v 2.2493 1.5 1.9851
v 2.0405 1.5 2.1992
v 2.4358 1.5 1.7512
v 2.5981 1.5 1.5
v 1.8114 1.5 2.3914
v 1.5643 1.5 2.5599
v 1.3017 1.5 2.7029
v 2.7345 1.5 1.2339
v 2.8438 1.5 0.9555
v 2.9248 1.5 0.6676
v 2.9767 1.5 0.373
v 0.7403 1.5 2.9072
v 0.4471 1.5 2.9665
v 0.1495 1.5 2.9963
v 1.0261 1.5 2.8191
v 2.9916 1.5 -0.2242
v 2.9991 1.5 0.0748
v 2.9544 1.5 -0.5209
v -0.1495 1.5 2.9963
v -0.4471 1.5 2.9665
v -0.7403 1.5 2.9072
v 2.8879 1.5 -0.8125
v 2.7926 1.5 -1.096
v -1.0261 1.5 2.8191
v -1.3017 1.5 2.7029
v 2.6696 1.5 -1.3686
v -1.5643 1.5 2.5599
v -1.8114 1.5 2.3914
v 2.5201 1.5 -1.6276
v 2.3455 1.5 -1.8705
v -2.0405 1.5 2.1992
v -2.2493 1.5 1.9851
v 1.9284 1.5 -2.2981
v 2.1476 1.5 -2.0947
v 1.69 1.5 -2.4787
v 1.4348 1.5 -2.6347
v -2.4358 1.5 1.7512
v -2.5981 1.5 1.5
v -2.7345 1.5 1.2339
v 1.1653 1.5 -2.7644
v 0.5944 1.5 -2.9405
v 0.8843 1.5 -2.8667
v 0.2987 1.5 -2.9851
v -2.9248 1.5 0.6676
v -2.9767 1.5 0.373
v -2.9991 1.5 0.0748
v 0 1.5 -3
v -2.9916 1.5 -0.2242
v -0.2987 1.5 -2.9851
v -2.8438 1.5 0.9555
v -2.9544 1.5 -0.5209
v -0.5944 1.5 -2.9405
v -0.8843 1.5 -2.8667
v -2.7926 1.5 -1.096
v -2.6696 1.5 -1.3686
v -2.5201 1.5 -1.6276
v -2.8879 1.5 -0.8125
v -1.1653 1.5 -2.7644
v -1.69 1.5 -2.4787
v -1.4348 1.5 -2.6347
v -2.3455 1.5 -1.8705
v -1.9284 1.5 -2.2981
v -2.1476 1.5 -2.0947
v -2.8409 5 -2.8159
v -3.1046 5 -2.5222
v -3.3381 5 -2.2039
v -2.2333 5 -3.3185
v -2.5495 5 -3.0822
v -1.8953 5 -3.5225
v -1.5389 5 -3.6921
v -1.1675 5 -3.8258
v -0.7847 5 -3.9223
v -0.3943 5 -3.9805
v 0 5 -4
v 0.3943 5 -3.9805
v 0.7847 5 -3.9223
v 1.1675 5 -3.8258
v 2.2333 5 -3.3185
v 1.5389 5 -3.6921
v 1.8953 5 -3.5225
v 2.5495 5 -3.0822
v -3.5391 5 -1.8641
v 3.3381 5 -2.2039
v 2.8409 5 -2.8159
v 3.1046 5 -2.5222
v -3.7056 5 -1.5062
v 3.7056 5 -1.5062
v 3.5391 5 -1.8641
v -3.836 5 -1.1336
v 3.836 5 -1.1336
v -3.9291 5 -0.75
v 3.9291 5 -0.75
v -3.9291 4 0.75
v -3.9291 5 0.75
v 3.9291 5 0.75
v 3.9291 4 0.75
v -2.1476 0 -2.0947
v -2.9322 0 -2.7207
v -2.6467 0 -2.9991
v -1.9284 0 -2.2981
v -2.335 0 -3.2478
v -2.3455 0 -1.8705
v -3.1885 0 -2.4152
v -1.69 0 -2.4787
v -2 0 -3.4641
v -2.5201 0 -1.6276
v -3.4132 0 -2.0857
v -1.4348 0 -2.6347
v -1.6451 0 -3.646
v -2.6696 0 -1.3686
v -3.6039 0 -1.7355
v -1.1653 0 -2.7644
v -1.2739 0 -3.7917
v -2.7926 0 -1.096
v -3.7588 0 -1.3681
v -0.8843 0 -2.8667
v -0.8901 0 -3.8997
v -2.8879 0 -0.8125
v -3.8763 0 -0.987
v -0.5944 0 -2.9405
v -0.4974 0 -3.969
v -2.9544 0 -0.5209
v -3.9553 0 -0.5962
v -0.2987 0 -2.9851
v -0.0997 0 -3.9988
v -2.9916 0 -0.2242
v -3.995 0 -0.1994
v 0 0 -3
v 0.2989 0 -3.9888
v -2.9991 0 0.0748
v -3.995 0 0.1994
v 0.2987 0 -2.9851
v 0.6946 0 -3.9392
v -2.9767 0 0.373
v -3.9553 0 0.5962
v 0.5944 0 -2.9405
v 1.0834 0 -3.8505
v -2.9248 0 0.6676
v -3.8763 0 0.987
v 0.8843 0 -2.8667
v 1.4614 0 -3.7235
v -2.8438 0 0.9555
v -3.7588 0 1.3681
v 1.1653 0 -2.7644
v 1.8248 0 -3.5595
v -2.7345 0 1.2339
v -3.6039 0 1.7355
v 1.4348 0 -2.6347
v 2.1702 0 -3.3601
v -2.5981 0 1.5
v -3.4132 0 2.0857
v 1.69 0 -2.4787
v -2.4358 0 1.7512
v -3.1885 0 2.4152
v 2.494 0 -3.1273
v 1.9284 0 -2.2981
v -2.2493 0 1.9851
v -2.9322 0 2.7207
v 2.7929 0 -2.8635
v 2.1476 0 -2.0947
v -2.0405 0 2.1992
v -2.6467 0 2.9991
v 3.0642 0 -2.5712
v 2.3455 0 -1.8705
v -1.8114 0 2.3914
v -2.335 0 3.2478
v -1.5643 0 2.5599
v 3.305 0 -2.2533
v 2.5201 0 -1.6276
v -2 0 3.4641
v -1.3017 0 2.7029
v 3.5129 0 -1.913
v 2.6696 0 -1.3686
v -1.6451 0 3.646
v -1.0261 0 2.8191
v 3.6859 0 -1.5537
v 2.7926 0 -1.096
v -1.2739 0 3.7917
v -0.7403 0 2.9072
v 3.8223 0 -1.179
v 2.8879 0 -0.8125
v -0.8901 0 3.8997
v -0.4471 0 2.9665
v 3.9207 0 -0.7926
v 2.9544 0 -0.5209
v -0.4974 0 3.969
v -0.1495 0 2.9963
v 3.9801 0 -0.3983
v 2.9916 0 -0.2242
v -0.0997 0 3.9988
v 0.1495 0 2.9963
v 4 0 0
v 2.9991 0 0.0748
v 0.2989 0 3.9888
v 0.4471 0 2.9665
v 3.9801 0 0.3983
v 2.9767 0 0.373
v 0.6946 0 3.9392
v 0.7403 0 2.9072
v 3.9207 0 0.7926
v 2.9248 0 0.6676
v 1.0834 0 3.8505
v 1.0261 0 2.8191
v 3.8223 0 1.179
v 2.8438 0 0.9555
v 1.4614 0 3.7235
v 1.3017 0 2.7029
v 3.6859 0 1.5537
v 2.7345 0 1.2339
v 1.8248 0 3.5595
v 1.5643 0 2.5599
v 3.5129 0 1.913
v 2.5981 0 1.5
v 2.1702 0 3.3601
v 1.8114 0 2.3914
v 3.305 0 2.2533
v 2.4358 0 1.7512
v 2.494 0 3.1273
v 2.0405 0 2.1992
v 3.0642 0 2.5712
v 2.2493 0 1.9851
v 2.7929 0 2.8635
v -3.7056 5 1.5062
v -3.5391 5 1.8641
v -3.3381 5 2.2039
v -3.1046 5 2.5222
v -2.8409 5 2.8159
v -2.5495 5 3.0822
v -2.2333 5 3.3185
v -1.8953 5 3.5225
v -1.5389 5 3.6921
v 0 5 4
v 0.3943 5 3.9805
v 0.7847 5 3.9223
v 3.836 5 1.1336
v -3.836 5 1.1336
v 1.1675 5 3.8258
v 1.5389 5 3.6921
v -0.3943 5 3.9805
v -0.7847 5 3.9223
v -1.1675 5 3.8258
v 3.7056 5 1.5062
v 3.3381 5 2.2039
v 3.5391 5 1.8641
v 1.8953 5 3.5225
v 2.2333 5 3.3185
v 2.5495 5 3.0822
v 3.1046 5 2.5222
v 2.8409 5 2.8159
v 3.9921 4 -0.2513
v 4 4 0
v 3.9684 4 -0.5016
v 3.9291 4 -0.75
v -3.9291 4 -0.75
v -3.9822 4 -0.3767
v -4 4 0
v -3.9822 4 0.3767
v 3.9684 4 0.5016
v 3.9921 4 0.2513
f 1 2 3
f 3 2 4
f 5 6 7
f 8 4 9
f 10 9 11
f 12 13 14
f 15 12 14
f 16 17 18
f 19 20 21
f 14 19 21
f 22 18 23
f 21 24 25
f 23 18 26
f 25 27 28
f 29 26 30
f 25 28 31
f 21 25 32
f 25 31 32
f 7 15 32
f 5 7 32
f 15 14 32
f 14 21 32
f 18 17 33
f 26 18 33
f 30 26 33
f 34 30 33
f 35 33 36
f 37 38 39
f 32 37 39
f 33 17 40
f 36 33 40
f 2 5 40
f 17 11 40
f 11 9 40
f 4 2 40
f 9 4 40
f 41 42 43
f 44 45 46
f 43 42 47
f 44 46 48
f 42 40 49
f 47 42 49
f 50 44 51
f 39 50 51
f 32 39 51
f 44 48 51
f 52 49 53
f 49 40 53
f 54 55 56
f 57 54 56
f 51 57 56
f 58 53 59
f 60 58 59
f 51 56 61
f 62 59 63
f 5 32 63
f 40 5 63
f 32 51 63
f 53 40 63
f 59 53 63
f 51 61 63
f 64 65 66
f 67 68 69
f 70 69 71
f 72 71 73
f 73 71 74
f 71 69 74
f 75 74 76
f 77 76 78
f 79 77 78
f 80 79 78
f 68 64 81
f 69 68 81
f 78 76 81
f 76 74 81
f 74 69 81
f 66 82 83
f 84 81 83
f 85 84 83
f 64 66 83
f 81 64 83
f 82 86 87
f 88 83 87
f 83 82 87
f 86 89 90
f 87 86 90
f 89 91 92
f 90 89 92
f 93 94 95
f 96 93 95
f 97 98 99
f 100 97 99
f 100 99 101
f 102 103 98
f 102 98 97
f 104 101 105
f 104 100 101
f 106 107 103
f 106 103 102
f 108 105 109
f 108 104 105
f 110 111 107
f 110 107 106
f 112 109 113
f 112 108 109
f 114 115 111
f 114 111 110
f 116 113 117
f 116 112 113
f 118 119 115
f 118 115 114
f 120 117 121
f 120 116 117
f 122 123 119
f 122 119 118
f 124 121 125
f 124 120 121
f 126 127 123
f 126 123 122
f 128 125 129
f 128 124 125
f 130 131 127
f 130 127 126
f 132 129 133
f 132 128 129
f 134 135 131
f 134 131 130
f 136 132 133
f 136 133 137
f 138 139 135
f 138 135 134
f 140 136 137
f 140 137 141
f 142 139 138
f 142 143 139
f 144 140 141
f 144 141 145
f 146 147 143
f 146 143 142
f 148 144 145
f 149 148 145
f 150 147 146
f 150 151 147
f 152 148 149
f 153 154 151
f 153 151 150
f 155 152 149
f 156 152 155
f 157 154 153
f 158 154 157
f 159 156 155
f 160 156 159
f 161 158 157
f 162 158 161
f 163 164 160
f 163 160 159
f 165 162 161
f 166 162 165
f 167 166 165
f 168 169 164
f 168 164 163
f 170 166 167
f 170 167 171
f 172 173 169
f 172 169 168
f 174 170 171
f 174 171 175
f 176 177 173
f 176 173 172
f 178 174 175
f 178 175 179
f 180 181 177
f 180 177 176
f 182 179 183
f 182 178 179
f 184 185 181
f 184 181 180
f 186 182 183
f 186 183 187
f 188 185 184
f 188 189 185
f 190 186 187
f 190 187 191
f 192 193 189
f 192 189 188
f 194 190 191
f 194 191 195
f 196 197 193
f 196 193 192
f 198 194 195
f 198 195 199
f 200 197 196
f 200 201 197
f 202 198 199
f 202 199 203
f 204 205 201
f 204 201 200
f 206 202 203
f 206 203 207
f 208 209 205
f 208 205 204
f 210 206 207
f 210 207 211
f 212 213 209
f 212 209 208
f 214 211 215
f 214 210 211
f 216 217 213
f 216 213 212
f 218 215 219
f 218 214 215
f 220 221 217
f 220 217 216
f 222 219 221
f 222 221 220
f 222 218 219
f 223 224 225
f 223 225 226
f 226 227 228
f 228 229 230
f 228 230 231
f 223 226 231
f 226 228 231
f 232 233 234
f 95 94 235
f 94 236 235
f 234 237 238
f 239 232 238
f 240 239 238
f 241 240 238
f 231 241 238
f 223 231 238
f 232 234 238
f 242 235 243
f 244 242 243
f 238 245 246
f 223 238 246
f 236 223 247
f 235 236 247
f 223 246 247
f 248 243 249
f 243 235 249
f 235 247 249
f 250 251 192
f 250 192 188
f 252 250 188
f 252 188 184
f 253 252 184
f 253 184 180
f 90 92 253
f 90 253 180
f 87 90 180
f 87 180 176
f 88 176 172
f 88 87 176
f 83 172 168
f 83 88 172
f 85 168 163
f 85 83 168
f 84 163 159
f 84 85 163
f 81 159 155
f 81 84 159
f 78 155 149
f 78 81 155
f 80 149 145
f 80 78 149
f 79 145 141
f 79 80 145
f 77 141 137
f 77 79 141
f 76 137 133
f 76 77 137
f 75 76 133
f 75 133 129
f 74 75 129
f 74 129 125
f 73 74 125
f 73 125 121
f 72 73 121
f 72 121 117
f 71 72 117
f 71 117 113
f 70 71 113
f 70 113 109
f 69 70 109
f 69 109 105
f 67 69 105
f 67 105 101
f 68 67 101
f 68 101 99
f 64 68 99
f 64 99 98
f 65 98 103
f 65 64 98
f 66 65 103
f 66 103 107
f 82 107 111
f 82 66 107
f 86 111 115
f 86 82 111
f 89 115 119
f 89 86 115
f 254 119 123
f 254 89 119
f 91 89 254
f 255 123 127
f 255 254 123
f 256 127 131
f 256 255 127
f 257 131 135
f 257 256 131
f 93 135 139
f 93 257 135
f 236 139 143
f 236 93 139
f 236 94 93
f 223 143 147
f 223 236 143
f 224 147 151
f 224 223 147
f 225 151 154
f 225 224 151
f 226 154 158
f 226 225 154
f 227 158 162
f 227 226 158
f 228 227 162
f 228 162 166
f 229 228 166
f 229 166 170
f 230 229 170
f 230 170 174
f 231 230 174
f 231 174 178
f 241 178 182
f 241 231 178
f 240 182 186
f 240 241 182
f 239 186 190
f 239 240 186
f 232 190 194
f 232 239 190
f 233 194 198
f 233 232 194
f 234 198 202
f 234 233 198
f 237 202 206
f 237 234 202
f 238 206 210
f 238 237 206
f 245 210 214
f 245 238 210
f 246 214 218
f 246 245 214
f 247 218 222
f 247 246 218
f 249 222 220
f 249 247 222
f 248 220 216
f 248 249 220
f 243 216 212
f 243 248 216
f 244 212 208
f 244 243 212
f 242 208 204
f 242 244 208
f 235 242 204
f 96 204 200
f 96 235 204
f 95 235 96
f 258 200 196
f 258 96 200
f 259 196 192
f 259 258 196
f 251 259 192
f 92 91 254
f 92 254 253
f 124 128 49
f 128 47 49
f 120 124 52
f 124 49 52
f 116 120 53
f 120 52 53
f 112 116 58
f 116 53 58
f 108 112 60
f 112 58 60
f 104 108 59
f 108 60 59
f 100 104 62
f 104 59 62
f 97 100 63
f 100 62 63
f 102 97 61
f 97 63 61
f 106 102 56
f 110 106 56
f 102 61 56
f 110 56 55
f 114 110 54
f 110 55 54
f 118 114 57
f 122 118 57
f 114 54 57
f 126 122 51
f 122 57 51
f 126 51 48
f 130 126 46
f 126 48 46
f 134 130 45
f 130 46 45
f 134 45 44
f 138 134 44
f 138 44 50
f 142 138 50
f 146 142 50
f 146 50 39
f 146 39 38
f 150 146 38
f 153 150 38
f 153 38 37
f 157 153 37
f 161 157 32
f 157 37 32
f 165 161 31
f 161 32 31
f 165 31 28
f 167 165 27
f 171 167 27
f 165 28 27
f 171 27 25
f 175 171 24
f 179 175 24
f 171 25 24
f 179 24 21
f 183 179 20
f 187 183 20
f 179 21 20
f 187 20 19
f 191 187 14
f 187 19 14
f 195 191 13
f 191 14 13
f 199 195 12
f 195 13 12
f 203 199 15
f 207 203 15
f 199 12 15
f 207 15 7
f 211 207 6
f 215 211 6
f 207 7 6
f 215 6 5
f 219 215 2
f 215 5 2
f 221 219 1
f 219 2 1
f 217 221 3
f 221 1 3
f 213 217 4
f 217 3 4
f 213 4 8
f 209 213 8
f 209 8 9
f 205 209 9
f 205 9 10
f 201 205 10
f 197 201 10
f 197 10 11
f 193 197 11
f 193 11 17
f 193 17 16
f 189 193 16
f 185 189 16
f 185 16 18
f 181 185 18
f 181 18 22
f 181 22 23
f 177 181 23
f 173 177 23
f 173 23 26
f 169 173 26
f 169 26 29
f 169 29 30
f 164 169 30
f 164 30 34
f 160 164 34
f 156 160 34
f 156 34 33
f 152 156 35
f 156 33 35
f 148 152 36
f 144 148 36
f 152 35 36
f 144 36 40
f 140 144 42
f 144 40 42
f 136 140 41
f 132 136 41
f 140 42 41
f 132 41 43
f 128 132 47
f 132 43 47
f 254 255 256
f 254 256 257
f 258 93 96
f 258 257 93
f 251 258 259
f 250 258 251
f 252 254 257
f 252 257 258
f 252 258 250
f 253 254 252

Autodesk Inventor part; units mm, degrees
ref_plane "YZ Plane" through (0, 0, 0) normal (1, 0, 0) x (0, 1, 0)
ref_plane "XZ Plane" through (0, 0, 0) normal (0, 1, 0) x (-1, 0, 0)
ref_plane "XY Plane" through (0, 0, 0) normal (0, 0, 1) x (1, 0, 0)
sketch "Sketch1" plane through (0, 0, 0) normal (0, 0, 1) x (1, 0, 0)
  line L0 (0, 0) -> (4, 0)
  line L1 (4, 0) -> (4, 5)
  line L2 (4, 5) -> (0, 5)
  line L3 (0, 5) -> (0, 0)
  point P0 (0, 2.5)
  dimension "d0" = 5
  dimension "d1" = 8
revolve "Revolution1" add sketch "Sketch1" angle 360 about axis through (0, 5, 0) along (0, -1, 0)
sketch "Sketch2" plane through (0, 5, 0) normal (0, 1, 0) x (1, 0, 0)
  circle A0 centre (0, 0) radius 4 projected
  circle A1 centre (0, 0) radius 4 projected
  line L0 (-3.9291, -0.75) -> (3.9291, -0.75)
  line L1 (-3.9291, 0.75) -> (3.9291, 0.75)
  point P0 (0, -0.75)
  dimension "d3" = 0.75
  dimension "d4" = 0.75
extrude "Extrusion1" cut sketch "Sketch2" against normal blind 1 contours A0 L0 L1
sketch "Sketch3" plane through (0, 0, 0) normal (0, -1, 0) x (1, 0, 0)
  circle A0 centre (0, 0) radius 4 projected
hole "Hole1" at (0, 0, 0) direction (0, 1, 0) diameter 6 depth 1.5
thread "Thread1" size "M8x1.25" class "6g" standard "ISO Metric profile" length 10
equation "\"d4\" = d3"
properties part number "138"
